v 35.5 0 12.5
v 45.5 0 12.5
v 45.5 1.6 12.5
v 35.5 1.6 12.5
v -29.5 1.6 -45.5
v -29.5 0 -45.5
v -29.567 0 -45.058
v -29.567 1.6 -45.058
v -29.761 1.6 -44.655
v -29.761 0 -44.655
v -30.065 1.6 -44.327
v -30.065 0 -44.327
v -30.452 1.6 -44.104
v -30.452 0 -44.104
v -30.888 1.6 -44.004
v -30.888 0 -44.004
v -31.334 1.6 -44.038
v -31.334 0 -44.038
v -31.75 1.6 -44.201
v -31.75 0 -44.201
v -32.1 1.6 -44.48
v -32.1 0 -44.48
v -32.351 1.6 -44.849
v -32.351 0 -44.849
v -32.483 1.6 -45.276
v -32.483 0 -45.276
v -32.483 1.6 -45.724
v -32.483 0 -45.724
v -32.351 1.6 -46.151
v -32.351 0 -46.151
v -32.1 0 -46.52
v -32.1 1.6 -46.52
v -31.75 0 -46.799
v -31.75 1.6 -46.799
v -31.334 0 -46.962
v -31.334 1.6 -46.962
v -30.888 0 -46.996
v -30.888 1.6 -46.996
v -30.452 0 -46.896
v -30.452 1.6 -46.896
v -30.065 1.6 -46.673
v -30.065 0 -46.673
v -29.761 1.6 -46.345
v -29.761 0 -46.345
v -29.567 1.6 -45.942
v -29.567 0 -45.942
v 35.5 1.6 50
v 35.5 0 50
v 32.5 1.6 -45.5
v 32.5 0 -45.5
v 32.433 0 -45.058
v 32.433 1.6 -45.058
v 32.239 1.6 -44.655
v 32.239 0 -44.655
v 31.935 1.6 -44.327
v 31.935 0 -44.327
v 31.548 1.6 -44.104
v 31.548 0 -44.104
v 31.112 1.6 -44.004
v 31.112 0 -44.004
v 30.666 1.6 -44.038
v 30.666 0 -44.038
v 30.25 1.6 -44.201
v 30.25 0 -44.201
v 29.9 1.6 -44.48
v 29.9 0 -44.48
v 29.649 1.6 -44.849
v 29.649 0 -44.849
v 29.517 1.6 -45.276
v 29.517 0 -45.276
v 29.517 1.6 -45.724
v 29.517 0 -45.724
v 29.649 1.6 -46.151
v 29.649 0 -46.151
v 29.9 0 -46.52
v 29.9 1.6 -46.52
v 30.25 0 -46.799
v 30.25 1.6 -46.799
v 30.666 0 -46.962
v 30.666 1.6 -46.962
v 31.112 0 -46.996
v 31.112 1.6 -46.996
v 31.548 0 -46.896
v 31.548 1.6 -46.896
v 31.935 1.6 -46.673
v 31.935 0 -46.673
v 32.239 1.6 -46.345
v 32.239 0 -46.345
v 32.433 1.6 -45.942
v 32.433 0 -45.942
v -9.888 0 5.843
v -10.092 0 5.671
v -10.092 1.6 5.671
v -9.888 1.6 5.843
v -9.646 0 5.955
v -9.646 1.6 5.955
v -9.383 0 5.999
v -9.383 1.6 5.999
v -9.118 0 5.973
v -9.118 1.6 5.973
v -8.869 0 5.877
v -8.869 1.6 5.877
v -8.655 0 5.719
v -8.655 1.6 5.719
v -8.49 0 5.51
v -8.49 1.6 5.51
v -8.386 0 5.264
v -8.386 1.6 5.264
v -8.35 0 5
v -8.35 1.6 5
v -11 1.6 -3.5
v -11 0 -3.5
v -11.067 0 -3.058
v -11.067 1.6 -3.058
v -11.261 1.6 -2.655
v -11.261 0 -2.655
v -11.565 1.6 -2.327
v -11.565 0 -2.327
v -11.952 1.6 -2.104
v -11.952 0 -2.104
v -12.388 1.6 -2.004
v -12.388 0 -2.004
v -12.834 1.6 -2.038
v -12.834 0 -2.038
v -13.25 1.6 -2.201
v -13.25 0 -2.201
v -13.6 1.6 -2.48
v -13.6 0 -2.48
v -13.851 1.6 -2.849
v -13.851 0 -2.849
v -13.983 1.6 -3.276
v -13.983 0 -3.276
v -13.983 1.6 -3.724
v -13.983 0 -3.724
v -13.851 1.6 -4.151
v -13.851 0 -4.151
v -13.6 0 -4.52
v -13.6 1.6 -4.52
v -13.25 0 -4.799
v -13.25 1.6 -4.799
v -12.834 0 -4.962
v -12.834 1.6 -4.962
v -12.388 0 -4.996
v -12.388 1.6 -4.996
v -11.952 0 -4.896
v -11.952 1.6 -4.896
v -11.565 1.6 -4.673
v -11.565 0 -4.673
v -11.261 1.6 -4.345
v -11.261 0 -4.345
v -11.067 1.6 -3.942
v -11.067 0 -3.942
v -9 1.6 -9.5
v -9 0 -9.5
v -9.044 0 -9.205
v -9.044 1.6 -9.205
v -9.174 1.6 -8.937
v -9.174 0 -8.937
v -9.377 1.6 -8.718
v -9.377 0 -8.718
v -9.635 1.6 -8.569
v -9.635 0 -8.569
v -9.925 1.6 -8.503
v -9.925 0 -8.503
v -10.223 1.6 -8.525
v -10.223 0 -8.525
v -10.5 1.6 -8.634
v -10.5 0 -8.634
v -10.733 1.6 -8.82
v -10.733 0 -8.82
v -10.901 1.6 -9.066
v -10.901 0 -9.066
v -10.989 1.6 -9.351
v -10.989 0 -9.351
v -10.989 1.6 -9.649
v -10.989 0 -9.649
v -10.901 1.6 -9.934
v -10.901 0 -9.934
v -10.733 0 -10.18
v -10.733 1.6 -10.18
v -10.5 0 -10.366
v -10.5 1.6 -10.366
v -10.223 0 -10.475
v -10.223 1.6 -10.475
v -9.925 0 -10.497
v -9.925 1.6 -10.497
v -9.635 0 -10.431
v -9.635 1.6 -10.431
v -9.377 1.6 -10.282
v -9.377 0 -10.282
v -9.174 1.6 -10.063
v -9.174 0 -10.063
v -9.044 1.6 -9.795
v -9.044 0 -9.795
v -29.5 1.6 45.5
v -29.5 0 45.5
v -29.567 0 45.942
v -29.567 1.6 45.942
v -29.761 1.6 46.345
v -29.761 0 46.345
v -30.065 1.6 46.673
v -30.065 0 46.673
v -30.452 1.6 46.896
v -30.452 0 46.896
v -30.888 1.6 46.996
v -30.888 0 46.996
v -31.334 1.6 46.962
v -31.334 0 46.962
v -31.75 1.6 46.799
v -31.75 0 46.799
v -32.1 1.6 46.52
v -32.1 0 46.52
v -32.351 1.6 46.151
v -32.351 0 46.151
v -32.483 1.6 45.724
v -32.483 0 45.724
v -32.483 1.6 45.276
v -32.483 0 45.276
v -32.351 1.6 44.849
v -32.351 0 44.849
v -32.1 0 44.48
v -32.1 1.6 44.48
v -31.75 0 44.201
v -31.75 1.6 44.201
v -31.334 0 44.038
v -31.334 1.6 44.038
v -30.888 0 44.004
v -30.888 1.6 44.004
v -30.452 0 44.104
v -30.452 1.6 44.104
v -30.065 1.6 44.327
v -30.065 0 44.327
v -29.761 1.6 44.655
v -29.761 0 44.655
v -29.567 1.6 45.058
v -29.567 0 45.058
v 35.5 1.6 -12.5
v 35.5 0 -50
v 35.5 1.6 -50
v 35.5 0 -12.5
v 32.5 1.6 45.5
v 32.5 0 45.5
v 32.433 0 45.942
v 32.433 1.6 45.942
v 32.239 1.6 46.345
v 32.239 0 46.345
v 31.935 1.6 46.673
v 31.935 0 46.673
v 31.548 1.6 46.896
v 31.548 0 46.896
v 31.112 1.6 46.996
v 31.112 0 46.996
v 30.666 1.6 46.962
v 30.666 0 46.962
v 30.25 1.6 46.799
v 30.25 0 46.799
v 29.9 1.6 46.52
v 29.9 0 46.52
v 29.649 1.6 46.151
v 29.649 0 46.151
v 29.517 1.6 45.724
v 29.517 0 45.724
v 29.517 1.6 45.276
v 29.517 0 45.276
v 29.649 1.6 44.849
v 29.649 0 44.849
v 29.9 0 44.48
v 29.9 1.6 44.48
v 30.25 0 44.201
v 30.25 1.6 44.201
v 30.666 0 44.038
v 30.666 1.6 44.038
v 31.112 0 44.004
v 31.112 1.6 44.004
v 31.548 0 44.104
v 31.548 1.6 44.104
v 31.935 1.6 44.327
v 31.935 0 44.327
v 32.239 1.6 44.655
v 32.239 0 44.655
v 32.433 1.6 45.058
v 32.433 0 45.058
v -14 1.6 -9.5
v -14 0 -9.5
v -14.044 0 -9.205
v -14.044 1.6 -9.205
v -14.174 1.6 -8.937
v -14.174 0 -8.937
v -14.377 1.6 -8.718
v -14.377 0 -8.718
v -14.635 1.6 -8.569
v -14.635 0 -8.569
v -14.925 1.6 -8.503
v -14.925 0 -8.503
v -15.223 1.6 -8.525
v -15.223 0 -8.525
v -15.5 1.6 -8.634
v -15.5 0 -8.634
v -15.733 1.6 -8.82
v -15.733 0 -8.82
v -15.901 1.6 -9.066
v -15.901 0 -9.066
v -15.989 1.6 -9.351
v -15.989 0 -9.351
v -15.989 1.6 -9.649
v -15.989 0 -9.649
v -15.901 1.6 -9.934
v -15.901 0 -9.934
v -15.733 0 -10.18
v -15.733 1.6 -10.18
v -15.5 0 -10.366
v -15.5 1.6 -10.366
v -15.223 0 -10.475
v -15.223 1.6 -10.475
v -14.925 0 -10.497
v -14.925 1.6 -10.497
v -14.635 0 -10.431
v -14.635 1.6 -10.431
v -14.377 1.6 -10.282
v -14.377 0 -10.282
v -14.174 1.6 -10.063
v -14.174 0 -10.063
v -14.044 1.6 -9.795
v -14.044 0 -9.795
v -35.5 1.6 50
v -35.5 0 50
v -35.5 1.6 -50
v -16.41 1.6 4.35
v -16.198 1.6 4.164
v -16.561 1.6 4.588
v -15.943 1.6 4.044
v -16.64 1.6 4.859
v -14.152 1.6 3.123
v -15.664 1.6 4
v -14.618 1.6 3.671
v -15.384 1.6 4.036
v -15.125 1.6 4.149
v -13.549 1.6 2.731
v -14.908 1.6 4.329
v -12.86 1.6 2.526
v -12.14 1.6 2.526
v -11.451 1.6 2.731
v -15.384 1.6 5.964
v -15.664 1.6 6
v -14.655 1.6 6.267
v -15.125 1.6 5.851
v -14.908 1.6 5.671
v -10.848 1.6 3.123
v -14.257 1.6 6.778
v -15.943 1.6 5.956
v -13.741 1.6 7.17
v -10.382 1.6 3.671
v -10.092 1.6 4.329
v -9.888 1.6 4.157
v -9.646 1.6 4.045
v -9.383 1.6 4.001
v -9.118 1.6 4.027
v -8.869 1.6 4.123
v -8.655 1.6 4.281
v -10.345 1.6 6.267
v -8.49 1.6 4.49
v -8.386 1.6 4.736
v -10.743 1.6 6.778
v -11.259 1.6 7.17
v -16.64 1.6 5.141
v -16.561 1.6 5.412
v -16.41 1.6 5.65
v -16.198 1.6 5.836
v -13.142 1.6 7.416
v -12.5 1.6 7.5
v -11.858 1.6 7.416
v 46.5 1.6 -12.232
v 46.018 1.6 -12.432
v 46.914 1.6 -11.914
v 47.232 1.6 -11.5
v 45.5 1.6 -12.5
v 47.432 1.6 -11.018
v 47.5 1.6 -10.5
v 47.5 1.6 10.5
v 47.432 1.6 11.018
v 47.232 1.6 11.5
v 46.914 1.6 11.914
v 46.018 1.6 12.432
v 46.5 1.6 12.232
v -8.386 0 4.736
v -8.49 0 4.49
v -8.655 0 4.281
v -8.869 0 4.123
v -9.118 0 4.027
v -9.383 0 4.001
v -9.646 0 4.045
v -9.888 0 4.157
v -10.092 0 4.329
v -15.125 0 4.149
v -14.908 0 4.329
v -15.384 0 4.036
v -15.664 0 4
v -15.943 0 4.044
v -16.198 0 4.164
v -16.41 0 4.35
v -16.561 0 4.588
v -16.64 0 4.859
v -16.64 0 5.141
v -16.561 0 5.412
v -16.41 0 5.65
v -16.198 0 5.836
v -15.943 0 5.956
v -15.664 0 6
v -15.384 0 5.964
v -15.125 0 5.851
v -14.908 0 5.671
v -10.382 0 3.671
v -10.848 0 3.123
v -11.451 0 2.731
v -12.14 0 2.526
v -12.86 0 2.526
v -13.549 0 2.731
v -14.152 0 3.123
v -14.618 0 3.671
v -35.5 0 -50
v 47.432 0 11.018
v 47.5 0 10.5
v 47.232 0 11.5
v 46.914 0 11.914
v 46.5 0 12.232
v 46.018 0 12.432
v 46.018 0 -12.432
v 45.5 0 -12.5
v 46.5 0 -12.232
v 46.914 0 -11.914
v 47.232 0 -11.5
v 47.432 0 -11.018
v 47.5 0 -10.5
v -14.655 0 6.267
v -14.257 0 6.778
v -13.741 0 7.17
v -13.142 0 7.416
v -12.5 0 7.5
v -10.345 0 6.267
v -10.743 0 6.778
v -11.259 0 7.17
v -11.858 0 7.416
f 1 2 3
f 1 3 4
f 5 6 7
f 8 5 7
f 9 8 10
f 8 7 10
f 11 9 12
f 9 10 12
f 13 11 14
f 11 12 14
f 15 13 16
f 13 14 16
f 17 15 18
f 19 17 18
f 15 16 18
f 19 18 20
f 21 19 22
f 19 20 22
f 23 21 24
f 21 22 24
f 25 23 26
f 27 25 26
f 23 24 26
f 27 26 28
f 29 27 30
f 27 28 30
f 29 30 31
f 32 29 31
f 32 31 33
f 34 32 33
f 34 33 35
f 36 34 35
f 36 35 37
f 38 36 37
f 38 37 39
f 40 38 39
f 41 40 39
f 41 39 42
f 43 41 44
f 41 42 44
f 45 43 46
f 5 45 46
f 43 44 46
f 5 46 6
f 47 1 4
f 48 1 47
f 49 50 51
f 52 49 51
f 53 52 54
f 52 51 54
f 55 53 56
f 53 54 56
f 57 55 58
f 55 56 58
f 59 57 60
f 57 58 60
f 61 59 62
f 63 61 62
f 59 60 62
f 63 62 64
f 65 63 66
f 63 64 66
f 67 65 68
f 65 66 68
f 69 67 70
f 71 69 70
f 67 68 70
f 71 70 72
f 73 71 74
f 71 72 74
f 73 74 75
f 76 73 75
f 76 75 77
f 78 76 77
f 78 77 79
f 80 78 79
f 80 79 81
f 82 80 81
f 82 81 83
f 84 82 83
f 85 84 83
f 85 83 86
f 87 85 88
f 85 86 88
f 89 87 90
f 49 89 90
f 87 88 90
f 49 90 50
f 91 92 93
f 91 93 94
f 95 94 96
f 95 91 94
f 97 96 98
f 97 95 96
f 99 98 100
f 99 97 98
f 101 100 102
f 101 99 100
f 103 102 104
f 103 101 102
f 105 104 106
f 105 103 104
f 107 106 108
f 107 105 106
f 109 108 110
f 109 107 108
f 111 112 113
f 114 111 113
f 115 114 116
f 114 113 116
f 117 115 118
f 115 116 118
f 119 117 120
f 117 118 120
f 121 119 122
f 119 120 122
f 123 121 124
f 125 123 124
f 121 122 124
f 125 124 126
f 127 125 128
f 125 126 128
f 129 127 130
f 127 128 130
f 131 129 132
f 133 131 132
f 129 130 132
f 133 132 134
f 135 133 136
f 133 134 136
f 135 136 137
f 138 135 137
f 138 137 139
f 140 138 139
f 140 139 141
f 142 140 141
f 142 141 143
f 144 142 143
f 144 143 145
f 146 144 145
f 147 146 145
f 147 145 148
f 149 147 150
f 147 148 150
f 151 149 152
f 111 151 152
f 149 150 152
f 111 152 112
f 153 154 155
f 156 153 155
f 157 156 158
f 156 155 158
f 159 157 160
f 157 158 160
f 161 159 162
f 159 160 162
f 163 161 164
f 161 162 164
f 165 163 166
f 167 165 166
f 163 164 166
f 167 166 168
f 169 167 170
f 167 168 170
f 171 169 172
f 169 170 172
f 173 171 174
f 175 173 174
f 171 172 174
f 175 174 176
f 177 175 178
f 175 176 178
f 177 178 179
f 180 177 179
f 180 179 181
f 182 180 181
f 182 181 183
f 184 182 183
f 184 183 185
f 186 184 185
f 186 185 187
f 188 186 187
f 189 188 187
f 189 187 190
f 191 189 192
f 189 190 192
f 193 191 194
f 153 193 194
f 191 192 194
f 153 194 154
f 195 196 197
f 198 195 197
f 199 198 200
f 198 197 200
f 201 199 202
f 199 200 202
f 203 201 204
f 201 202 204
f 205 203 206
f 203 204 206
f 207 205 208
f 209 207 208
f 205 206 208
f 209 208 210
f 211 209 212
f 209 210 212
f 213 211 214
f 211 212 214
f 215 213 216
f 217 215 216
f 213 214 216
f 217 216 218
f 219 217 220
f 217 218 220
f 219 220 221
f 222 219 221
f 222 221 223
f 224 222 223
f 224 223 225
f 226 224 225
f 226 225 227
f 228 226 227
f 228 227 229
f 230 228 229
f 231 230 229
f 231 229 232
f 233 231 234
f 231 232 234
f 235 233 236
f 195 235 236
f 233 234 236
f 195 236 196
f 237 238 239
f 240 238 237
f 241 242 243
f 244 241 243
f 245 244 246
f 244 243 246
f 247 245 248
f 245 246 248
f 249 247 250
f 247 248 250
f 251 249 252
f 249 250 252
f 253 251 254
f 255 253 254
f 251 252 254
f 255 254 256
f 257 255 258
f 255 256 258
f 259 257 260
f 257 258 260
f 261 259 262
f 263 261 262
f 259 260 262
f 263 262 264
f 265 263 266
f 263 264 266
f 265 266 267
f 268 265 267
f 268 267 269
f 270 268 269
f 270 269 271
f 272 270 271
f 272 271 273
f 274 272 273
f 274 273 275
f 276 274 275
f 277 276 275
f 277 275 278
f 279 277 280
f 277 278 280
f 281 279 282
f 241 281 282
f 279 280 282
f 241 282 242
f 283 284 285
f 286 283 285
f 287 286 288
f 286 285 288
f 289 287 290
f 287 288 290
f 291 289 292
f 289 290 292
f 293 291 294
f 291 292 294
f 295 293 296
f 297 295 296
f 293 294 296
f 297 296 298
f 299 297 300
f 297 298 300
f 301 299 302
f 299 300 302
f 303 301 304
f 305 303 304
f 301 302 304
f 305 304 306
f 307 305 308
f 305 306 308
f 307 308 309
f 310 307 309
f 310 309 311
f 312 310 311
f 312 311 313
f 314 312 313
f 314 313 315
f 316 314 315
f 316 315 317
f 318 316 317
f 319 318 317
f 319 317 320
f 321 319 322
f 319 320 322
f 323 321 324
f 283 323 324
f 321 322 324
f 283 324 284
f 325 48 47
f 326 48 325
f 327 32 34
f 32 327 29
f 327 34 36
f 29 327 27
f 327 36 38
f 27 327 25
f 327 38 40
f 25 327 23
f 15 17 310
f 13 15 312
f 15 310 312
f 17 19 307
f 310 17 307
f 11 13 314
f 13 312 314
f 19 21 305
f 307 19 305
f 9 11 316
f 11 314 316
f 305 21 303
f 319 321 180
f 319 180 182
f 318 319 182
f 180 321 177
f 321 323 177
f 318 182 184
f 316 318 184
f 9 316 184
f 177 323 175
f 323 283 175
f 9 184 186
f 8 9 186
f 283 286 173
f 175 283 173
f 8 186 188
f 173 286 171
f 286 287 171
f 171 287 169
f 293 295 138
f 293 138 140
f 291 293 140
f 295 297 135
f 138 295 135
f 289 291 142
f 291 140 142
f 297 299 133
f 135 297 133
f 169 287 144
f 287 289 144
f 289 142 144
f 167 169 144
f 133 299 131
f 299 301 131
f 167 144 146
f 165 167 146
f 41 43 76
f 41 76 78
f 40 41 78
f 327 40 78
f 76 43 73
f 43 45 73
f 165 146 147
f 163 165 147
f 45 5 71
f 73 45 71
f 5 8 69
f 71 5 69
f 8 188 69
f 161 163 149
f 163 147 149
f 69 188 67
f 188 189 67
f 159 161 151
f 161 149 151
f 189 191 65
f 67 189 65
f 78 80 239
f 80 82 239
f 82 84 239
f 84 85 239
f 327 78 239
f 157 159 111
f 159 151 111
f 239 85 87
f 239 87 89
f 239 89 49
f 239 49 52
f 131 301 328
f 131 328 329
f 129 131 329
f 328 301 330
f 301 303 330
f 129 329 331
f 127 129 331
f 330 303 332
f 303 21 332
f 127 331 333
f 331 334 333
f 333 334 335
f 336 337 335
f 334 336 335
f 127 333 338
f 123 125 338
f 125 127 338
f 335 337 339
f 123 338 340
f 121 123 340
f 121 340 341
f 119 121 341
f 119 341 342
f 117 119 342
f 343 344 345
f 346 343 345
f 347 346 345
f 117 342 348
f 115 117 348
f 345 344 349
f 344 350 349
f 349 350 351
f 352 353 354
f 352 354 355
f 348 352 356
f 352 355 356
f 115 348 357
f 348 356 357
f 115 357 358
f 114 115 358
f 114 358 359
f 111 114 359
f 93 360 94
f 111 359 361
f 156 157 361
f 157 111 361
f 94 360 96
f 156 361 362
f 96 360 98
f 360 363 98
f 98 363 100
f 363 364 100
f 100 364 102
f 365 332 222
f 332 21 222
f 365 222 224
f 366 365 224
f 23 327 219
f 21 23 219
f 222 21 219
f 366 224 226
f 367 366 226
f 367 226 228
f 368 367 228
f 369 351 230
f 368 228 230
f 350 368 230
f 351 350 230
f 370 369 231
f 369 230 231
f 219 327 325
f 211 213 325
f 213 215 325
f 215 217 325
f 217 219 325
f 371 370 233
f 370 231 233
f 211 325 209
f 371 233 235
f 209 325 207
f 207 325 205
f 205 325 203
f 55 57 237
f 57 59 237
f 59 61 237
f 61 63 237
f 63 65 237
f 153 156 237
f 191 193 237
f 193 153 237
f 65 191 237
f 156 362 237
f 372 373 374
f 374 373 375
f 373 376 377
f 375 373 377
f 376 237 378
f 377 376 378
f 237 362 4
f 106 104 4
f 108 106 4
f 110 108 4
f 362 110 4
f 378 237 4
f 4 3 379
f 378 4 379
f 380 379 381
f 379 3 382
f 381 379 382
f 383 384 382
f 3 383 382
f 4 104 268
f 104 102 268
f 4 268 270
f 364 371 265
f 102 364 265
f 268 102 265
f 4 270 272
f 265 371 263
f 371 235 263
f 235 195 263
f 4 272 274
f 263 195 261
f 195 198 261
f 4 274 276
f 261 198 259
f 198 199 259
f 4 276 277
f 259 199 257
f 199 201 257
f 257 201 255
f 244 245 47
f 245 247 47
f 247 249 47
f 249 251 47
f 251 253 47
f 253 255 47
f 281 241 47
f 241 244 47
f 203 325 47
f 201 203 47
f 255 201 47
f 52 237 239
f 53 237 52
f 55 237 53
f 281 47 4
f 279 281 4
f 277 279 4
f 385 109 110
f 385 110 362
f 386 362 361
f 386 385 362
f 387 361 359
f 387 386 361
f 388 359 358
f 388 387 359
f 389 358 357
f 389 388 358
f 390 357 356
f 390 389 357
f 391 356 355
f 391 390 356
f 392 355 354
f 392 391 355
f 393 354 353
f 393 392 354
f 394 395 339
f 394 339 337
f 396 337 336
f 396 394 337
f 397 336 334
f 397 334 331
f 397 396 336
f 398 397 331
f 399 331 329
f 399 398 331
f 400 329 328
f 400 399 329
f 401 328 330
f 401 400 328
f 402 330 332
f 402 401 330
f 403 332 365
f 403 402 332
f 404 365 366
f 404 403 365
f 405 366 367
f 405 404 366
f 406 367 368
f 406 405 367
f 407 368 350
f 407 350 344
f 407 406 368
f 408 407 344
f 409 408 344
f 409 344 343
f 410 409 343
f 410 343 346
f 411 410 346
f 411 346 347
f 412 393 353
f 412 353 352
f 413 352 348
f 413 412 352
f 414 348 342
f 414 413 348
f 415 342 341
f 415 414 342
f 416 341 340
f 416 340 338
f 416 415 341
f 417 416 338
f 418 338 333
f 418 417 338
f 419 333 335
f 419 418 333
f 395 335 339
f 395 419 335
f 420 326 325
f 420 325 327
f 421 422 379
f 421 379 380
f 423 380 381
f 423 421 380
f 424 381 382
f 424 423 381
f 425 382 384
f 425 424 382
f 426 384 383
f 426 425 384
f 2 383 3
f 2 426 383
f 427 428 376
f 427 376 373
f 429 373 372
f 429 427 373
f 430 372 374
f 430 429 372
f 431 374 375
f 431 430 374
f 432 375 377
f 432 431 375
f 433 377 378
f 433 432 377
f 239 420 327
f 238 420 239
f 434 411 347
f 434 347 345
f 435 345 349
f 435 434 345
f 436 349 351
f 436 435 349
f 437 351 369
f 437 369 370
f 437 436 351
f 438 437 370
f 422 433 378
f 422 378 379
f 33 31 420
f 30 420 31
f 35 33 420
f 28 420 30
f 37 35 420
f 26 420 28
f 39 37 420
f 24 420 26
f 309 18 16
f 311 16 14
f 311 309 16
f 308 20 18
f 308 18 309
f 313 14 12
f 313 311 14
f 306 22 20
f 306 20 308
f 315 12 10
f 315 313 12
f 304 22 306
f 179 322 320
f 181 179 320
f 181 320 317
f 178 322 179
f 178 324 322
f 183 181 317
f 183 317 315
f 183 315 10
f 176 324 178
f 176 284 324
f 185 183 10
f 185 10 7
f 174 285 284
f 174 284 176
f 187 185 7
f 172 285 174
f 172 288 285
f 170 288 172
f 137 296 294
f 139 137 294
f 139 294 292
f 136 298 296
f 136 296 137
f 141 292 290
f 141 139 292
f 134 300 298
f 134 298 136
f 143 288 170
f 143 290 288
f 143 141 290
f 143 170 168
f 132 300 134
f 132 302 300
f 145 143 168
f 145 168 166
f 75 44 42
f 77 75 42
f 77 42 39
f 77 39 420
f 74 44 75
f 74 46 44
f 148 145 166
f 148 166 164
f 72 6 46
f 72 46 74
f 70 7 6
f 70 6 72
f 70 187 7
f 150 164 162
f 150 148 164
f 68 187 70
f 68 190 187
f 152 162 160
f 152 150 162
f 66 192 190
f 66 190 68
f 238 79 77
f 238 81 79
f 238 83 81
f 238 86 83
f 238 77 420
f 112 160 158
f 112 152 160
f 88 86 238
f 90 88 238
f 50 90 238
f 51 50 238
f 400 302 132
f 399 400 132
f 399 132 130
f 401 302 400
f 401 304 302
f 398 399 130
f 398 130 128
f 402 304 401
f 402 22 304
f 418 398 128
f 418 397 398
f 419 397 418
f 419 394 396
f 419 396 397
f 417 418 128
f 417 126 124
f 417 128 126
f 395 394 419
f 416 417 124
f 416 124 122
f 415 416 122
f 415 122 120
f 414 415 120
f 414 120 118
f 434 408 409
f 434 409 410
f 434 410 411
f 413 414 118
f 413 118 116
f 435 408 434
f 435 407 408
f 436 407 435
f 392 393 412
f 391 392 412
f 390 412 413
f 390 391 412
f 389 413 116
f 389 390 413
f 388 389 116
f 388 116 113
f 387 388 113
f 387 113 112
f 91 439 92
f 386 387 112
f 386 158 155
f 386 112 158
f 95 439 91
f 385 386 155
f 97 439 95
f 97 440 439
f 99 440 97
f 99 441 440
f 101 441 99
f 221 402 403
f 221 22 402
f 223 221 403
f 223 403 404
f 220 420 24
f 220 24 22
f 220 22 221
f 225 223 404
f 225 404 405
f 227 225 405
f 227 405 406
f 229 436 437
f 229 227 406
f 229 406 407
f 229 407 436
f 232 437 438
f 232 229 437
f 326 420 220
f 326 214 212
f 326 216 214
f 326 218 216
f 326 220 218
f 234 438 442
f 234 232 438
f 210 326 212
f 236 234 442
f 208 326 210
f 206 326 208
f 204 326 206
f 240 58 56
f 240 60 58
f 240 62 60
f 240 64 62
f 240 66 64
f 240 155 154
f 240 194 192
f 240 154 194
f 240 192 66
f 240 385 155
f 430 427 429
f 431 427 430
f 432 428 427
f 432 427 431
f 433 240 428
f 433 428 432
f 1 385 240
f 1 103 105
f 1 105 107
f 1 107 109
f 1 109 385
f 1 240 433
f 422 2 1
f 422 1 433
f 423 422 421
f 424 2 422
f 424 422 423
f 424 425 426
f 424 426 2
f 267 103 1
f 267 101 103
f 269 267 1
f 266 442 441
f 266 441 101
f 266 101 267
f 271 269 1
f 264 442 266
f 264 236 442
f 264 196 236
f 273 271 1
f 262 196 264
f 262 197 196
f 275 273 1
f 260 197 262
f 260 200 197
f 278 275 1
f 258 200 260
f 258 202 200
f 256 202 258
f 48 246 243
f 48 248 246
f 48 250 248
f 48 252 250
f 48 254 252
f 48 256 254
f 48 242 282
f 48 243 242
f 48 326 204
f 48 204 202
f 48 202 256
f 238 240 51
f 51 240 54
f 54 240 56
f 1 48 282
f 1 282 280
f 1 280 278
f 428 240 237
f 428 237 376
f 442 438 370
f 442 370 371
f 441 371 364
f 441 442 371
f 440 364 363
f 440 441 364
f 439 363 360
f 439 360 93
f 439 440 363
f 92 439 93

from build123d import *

# Parameters (mm, degrees)
F0_R     = 1.5
F0_R_2   = 1
F1_DEPTH = 1.6


with BuildPart() as f1:
    # F0 (on Front) → F1 (new body)
    with BuildSketch(Plane.XZ):
        with BuildLine():
            Line((35.5, 50), (-35.5, 50))
            Line((-35.5, 50), (-35.5, 35))
            Line((-35.5, 35), (-35.5, -27))
            Line((-35.5, -27), (-35.5, -50))
            Line((-35.5, -50), (35.5, -50))
            Line((35.5, -50), (35.5, -12.5))
            Line((35.5, -12.5), (45.5, -12.5))
            ThreePointArc((45.5, -12.5), (46.9142135624, -11.9142135624), (47.5, -10.5))
            Line((47.5, -10.5), (47.5, 10.5))
            ThreePointArc((47.5, 10.5), (46.9142135624, 11.9142135624), (45.5, 12.5))
            Line((45.5, 12.5), (35.5, 12.5))
            Line((35.5, 12.5), (35.5, 50))
        make_face()
        with Locations((-31, -45.5)):
            Circle(F0_R, mode=Mode.SUBTRACT)
        with Locations((-15, -9.5)):
            Circle(F0_R_2, mode=Mode.SUBTRACT)
        with Locations((-10, -9.5)):
            Circle(F0_R_2, mode=Mode.SUBTRACT)
        with Locations((-12.5, -3.5)):
            Circle(F0_R, mode=Mode.SUBTRACT)
        with Locations((31, -45.5)):
            Circle(F0_R, mode=Mode.SUBTRACT)
        with BuildLine():
            ThreePointArc((-12.5, 7.5), (-10.9878693139, 6.99084424), (-10.0916666667, 5.6707686304))
            ThreePointArc((-10.0916666667, 5.6707686304), (-8.9906023558, 5.9331845119), (-8.35, 5))
            ThreePointArc((-8.35, 5), (-8.9906023558, 4.0668154881), (-10.0916666667, 4.3292313696))
            ThreePointArc((-10.0916666667, 4.3292313696), (-12.5, 2.5), (-14.9083333333, 4.3292313696))
            ThreePointArc((-14.9083333333, 4.3292313696), (-16.65, 5), (-14.9083333333, 5.6707686304))
            ThreePointArc((-14.9083333333, 5.6707686304), (-14.0121306861, 6.99084424), (-12.5, 7.5))
        make_face(mode=Mode.SUBTRACT)
        with Locations((-31, 45.5)):
            Circle(F0_R, mode=Mode.SUBTRACT)
        with Locations((31, 45.5)):
            Circle(F0_R, mode=Mode.SUBTRACT)
    extrude(amount=-F1_DEPTH)


solid = f1.part
